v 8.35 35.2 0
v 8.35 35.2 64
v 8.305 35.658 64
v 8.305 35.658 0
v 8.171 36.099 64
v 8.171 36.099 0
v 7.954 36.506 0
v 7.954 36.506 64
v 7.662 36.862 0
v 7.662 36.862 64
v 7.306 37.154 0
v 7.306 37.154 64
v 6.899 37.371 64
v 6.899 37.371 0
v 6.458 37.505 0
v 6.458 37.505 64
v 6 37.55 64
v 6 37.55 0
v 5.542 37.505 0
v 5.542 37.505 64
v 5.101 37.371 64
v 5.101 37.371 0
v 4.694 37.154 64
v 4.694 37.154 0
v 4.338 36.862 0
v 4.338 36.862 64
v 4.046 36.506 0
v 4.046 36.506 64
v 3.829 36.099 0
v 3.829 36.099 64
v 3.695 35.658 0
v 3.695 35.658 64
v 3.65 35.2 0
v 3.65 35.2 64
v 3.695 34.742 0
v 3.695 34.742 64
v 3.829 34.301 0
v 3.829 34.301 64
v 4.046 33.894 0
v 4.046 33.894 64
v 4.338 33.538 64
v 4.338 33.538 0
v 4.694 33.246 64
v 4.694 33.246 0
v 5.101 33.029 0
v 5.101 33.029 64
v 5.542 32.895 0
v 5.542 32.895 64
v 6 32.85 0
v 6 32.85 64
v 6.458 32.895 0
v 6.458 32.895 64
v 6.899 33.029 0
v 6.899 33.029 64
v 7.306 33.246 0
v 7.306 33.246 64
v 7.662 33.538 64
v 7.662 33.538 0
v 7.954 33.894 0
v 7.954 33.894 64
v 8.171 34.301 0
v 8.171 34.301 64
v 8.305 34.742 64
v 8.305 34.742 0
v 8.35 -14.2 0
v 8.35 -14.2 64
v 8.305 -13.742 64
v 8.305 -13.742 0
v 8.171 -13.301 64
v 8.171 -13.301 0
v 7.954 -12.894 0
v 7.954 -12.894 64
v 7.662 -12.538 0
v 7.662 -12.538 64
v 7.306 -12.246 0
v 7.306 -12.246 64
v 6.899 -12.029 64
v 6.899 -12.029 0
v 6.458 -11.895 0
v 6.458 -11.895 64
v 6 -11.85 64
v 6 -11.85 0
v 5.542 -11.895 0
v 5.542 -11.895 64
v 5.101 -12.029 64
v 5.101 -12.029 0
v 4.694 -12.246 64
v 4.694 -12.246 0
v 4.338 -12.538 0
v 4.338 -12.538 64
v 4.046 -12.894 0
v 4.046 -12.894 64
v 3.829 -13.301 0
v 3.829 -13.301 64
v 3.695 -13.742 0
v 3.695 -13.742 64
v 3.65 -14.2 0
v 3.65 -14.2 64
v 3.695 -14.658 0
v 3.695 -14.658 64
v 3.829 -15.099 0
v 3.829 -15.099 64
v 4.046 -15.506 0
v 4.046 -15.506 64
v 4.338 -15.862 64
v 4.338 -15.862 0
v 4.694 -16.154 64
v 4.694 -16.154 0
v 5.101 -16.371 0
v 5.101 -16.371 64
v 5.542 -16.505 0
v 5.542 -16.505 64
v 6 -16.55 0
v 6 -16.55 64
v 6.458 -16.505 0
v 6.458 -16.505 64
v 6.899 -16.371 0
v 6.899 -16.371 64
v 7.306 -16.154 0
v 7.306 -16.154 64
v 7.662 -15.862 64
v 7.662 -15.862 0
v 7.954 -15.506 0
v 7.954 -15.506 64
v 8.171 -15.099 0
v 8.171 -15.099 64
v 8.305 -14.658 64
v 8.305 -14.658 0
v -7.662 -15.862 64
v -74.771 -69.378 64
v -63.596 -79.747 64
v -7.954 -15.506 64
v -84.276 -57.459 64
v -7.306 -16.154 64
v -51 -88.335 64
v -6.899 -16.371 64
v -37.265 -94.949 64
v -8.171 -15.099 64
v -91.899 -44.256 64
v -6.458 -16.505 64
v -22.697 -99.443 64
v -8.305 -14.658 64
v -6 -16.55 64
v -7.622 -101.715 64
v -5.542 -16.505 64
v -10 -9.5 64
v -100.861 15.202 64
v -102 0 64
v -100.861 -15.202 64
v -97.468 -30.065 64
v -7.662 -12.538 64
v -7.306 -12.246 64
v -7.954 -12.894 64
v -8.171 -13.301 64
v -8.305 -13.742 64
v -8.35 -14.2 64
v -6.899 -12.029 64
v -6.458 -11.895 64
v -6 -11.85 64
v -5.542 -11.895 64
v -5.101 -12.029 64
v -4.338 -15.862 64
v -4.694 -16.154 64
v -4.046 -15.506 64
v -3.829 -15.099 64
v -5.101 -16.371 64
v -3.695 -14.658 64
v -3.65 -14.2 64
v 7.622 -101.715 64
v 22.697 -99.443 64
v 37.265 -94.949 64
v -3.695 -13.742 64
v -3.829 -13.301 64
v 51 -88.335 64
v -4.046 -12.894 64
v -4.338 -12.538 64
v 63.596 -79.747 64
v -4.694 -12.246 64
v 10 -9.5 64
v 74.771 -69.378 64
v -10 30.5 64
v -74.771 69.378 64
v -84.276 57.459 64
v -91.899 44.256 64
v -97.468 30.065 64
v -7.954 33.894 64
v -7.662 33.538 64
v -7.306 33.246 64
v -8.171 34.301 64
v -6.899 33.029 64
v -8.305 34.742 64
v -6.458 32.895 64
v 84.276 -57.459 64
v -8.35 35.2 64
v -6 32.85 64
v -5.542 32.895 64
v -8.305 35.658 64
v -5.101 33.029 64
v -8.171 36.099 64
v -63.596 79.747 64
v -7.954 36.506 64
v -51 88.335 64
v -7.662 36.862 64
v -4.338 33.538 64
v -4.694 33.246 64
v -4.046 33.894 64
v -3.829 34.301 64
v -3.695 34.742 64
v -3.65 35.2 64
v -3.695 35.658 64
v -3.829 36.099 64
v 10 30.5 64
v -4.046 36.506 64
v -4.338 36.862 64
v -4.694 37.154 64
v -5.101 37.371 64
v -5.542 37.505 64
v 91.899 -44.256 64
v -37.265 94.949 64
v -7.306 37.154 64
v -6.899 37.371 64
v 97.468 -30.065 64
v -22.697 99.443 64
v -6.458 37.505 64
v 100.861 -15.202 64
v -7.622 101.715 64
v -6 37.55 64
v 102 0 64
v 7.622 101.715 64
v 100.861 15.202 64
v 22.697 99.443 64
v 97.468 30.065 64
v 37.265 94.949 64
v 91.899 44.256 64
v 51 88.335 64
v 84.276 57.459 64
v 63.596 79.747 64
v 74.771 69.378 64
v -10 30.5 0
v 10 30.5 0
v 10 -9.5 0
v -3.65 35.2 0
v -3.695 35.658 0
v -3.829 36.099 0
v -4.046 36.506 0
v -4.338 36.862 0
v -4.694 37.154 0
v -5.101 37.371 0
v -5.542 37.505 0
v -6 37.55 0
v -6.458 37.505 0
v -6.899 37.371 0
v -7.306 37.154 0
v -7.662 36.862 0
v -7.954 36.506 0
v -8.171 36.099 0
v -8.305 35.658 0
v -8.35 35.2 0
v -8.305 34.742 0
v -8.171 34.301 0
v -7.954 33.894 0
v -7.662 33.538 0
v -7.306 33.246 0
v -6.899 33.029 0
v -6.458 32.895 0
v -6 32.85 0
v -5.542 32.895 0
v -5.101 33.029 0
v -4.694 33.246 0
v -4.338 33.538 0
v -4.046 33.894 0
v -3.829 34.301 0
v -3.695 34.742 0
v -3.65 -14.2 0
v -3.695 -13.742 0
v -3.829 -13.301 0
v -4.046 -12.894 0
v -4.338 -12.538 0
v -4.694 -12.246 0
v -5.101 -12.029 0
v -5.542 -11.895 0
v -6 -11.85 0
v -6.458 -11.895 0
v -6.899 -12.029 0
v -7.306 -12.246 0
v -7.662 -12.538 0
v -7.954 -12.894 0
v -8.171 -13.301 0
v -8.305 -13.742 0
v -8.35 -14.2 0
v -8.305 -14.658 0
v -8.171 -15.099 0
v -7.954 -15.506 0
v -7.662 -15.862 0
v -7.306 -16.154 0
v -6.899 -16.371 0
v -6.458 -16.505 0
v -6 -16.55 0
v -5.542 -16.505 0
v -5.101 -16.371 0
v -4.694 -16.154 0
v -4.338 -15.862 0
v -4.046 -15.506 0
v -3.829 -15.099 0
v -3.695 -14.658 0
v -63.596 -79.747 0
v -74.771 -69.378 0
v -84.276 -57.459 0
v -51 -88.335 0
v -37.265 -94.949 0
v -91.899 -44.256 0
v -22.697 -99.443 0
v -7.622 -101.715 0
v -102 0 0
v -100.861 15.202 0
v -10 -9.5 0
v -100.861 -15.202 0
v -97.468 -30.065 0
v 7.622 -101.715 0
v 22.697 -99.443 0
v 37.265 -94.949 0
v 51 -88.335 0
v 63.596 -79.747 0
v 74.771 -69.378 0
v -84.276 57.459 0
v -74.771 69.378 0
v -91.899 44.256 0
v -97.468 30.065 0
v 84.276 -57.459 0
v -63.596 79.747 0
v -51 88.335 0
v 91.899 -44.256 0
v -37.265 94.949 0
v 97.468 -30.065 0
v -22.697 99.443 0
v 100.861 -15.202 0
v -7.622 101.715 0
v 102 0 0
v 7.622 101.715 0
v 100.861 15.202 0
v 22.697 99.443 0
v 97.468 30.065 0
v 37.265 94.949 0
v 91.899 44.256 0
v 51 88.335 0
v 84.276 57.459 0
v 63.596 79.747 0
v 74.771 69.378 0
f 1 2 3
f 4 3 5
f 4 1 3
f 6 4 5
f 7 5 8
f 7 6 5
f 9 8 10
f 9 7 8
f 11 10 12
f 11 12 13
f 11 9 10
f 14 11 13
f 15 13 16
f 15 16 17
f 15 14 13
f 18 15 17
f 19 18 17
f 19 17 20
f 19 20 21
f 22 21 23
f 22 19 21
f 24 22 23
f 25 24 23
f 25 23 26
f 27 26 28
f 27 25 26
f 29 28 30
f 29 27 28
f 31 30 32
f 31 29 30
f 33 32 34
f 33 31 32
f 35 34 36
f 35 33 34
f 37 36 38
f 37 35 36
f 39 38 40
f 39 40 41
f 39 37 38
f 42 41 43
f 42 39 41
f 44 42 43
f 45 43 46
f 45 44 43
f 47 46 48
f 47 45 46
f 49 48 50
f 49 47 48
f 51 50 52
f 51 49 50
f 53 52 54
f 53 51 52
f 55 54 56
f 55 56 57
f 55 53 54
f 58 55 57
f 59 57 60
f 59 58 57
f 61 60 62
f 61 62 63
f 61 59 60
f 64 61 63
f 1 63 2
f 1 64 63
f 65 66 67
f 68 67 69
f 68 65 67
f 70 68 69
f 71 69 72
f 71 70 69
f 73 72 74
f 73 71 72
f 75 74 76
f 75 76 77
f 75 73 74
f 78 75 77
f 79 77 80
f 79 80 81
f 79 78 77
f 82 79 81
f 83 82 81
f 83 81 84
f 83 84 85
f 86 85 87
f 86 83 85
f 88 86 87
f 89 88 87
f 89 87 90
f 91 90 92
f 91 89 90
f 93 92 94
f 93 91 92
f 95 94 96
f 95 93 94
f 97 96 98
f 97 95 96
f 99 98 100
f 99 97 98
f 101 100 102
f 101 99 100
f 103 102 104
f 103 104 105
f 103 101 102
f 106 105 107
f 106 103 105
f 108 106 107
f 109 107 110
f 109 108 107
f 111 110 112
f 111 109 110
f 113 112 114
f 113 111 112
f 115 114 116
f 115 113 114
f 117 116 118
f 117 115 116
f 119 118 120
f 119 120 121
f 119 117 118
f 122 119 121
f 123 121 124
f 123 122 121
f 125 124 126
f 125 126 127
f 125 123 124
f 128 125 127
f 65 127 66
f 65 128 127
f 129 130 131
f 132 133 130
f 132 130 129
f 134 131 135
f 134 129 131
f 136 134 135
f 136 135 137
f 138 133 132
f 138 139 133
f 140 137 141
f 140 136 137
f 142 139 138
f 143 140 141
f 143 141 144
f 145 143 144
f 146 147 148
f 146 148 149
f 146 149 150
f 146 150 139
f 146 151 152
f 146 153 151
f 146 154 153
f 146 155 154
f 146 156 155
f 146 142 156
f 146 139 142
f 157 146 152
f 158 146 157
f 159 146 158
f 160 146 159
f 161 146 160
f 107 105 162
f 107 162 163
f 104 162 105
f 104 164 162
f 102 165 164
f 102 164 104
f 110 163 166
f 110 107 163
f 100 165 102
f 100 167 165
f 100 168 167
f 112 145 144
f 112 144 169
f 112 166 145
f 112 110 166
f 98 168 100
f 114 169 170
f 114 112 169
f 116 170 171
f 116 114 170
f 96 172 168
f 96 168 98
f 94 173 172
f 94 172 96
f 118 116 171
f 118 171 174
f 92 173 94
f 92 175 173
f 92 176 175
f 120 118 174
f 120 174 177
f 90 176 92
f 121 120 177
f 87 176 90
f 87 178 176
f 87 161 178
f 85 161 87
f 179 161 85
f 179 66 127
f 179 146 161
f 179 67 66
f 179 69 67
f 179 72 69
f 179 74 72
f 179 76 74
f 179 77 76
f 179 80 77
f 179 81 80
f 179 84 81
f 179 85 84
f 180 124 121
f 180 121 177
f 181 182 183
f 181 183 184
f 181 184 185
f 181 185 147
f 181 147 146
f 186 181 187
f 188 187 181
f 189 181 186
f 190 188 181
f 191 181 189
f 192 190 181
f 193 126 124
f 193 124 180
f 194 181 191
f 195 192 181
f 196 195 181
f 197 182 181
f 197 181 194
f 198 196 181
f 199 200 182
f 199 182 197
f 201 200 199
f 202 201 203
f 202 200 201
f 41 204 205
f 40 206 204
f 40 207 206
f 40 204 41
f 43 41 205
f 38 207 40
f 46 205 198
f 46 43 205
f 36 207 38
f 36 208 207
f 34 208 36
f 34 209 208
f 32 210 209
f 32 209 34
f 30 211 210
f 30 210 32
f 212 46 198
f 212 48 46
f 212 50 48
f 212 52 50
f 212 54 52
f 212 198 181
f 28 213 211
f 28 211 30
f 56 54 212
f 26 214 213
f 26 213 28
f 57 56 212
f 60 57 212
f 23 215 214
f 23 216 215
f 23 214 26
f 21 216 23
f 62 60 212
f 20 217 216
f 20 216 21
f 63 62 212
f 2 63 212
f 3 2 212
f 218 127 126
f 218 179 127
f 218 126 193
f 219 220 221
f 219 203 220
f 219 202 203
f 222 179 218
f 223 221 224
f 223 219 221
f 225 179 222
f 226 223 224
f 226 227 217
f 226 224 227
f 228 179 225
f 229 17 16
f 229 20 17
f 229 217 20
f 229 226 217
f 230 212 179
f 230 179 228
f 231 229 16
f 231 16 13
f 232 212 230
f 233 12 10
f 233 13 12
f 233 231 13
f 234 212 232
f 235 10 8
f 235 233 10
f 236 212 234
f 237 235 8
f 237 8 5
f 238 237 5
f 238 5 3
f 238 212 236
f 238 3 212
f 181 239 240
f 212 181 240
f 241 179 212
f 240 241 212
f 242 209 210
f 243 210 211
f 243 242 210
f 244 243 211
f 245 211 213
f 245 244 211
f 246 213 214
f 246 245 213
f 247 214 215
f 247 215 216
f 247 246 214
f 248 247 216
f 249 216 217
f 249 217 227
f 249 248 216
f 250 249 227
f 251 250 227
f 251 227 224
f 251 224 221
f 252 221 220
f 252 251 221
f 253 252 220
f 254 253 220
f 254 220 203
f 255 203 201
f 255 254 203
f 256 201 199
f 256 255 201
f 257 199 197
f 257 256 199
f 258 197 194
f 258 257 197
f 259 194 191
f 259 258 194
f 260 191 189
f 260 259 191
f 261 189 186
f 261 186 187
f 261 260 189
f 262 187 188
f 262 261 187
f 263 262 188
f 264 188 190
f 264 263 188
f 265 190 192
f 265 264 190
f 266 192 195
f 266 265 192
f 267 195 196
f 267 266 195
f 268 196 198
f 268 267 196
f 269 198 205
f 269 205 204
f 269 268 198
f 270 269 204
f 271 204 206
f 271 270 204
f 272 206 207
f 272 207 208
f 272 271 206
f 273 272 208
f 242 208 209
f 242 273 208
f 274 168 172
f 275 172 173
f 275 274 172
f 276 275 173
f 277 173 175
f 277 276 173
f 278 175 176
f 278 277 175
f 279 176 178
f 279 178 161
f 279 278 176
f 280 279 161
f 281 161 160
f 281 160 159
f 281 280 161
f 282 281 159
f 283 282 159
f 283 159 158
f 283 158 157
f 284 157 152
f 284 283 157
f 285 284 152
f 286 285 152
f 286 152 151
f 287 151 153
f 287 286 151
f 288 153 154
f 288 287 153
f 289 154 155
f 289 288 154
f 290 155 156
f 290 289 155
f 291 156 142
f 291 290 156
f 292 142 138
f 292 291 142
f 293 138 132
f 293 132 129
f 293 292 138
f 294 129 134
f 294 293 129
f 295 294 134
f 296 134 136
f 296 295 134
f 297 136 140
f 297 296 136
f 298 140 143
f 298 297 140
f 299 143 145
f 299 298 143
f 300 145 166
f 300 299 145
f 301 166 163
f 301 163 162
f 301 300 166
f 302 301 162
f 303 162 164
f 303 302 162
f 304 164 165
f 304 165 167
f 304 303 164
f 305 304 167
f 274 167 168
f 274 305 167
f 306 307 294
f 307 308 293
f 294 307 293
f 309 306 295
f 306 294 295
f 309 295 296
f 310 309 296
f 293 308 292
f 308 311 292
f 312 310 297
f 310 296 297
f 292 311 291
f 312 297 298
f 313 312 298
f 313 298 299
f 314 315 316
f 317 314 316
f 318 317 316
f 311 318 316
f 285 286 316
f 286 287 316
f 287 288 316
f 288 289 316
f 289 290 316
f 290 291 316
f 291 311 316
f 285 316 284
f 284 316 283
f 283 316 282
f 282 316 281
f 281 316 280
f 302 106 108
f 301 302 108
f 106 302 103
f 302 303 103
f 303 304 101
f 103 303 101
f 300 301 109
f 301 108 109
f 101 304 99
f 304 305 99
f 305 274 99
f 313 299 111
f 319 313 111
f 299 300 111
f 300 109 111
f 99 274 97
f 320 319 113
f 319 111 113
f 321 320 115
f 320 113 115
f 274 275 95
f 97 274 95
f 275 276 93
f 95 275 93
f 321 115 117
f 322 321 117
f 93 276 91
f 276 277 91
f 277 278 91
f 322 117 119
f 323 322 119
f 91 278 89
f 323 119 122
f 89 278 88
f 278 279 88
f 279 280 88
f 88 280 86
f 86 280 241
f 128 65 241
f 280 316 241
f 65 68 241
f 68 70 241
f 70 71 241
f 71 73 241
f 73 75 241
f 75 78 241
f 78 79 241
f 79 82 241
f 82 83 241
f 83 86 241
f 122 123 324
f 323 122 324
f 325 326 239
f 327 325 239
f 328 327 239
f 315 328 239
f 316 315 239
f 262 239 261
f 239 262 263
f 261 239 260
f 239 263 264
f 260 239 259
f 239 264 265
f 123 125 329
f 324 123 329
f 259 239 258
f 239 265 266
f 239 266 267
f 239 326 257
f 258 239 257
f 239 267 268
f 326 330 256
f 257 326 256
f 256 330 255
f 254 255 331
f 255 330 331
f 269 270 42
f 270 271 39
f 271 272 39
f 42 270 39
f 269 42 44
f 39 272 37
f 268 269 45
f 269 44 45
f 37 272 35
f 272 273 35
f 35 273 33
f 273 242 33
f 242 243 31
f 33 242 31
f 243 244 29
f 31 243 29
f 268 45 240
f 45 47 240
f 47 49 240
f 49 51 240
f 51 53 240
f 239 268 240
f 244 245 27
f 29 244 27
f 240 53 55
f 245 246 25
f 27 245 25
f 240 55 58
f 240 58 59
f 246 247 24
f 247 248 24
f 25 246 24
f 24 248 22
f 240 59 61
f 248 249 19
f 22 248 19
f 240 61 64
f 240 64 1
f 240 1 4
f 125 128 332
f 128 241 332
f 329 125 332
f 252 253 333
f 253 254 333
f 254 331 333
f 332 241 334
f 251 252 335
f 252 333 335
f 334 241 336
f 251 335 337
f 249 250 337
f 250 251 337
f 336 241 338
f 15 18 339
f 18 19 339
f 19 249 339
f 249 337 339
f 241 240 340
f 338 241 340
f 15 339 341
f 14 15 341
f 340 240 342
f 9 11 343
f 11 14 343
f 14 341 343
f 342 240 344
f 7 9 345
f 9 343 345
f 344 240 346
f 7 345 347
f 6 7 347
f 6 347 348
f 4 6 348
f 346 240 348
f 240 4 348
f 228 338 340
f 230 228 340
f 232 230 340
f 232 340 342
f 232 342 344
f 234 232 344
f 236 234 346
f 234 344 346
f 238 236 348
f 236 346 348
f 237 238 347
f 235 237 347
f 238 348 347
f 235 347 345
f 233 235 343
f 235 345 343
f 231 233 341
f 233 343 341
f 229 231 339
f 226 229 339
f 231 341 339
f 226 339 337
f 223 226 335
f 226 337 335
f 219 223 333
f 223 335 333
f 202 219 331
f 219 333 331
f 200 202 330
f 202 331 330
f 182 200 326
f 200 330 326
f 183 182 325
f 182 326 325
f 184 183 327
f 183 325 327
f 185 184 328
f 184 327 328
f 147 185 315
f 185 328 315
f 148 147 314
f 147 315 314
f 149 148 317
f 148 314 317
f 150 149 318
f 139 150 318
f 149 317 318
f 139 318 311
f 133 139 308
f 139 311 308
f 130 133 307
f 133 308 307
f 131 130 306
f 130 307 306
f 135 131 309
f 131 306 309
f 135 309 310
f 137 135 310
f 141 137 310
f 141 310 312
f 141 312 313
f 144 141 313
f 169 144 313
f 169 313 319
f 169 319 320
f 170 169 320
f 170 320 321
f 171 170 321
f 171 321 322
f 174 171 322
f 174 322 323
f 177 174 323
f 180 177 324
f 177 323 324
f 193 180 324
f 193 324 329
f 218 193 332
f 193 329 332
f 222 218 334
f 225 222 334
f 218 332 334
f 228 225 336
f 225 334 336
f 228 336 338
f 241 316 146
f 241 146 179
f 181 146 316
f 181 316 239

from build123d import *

# Parameters (mm, degrees)
F0_R     = 102
F0_R_2   = 2.35
F0_W     = 20
F0_H     = 40
F1_DEPTH = 64


with BuildPart() as f1:
    # F0 (on Top) → F1 (new body)
    with BuildSketch(Plane.XY):
        Circle(F0_R)
        with Locations((-6, -14.2)):
            Circle(F0_R_2, mode=Mode.SUBTRACT)
        with Locations((6, -14.2)):
            Circle(F0_R_2, mode=Mode.SUBTRACT)
        with Locations((-6, 35.2)):
            Circle(F0_R_2, mode=Mode.SUBTRACT)
        with Locations((0, 10.5)):
            Rectangle(F0_W, F0_H, mode=Mode.SUBTRACT)
        with Locations((6, 35.2)):
            Circle(F0_R_2, mode=Mode.SUBTRACT)
    extrude(amount=F1_DEPTH)


solid = f1.part
